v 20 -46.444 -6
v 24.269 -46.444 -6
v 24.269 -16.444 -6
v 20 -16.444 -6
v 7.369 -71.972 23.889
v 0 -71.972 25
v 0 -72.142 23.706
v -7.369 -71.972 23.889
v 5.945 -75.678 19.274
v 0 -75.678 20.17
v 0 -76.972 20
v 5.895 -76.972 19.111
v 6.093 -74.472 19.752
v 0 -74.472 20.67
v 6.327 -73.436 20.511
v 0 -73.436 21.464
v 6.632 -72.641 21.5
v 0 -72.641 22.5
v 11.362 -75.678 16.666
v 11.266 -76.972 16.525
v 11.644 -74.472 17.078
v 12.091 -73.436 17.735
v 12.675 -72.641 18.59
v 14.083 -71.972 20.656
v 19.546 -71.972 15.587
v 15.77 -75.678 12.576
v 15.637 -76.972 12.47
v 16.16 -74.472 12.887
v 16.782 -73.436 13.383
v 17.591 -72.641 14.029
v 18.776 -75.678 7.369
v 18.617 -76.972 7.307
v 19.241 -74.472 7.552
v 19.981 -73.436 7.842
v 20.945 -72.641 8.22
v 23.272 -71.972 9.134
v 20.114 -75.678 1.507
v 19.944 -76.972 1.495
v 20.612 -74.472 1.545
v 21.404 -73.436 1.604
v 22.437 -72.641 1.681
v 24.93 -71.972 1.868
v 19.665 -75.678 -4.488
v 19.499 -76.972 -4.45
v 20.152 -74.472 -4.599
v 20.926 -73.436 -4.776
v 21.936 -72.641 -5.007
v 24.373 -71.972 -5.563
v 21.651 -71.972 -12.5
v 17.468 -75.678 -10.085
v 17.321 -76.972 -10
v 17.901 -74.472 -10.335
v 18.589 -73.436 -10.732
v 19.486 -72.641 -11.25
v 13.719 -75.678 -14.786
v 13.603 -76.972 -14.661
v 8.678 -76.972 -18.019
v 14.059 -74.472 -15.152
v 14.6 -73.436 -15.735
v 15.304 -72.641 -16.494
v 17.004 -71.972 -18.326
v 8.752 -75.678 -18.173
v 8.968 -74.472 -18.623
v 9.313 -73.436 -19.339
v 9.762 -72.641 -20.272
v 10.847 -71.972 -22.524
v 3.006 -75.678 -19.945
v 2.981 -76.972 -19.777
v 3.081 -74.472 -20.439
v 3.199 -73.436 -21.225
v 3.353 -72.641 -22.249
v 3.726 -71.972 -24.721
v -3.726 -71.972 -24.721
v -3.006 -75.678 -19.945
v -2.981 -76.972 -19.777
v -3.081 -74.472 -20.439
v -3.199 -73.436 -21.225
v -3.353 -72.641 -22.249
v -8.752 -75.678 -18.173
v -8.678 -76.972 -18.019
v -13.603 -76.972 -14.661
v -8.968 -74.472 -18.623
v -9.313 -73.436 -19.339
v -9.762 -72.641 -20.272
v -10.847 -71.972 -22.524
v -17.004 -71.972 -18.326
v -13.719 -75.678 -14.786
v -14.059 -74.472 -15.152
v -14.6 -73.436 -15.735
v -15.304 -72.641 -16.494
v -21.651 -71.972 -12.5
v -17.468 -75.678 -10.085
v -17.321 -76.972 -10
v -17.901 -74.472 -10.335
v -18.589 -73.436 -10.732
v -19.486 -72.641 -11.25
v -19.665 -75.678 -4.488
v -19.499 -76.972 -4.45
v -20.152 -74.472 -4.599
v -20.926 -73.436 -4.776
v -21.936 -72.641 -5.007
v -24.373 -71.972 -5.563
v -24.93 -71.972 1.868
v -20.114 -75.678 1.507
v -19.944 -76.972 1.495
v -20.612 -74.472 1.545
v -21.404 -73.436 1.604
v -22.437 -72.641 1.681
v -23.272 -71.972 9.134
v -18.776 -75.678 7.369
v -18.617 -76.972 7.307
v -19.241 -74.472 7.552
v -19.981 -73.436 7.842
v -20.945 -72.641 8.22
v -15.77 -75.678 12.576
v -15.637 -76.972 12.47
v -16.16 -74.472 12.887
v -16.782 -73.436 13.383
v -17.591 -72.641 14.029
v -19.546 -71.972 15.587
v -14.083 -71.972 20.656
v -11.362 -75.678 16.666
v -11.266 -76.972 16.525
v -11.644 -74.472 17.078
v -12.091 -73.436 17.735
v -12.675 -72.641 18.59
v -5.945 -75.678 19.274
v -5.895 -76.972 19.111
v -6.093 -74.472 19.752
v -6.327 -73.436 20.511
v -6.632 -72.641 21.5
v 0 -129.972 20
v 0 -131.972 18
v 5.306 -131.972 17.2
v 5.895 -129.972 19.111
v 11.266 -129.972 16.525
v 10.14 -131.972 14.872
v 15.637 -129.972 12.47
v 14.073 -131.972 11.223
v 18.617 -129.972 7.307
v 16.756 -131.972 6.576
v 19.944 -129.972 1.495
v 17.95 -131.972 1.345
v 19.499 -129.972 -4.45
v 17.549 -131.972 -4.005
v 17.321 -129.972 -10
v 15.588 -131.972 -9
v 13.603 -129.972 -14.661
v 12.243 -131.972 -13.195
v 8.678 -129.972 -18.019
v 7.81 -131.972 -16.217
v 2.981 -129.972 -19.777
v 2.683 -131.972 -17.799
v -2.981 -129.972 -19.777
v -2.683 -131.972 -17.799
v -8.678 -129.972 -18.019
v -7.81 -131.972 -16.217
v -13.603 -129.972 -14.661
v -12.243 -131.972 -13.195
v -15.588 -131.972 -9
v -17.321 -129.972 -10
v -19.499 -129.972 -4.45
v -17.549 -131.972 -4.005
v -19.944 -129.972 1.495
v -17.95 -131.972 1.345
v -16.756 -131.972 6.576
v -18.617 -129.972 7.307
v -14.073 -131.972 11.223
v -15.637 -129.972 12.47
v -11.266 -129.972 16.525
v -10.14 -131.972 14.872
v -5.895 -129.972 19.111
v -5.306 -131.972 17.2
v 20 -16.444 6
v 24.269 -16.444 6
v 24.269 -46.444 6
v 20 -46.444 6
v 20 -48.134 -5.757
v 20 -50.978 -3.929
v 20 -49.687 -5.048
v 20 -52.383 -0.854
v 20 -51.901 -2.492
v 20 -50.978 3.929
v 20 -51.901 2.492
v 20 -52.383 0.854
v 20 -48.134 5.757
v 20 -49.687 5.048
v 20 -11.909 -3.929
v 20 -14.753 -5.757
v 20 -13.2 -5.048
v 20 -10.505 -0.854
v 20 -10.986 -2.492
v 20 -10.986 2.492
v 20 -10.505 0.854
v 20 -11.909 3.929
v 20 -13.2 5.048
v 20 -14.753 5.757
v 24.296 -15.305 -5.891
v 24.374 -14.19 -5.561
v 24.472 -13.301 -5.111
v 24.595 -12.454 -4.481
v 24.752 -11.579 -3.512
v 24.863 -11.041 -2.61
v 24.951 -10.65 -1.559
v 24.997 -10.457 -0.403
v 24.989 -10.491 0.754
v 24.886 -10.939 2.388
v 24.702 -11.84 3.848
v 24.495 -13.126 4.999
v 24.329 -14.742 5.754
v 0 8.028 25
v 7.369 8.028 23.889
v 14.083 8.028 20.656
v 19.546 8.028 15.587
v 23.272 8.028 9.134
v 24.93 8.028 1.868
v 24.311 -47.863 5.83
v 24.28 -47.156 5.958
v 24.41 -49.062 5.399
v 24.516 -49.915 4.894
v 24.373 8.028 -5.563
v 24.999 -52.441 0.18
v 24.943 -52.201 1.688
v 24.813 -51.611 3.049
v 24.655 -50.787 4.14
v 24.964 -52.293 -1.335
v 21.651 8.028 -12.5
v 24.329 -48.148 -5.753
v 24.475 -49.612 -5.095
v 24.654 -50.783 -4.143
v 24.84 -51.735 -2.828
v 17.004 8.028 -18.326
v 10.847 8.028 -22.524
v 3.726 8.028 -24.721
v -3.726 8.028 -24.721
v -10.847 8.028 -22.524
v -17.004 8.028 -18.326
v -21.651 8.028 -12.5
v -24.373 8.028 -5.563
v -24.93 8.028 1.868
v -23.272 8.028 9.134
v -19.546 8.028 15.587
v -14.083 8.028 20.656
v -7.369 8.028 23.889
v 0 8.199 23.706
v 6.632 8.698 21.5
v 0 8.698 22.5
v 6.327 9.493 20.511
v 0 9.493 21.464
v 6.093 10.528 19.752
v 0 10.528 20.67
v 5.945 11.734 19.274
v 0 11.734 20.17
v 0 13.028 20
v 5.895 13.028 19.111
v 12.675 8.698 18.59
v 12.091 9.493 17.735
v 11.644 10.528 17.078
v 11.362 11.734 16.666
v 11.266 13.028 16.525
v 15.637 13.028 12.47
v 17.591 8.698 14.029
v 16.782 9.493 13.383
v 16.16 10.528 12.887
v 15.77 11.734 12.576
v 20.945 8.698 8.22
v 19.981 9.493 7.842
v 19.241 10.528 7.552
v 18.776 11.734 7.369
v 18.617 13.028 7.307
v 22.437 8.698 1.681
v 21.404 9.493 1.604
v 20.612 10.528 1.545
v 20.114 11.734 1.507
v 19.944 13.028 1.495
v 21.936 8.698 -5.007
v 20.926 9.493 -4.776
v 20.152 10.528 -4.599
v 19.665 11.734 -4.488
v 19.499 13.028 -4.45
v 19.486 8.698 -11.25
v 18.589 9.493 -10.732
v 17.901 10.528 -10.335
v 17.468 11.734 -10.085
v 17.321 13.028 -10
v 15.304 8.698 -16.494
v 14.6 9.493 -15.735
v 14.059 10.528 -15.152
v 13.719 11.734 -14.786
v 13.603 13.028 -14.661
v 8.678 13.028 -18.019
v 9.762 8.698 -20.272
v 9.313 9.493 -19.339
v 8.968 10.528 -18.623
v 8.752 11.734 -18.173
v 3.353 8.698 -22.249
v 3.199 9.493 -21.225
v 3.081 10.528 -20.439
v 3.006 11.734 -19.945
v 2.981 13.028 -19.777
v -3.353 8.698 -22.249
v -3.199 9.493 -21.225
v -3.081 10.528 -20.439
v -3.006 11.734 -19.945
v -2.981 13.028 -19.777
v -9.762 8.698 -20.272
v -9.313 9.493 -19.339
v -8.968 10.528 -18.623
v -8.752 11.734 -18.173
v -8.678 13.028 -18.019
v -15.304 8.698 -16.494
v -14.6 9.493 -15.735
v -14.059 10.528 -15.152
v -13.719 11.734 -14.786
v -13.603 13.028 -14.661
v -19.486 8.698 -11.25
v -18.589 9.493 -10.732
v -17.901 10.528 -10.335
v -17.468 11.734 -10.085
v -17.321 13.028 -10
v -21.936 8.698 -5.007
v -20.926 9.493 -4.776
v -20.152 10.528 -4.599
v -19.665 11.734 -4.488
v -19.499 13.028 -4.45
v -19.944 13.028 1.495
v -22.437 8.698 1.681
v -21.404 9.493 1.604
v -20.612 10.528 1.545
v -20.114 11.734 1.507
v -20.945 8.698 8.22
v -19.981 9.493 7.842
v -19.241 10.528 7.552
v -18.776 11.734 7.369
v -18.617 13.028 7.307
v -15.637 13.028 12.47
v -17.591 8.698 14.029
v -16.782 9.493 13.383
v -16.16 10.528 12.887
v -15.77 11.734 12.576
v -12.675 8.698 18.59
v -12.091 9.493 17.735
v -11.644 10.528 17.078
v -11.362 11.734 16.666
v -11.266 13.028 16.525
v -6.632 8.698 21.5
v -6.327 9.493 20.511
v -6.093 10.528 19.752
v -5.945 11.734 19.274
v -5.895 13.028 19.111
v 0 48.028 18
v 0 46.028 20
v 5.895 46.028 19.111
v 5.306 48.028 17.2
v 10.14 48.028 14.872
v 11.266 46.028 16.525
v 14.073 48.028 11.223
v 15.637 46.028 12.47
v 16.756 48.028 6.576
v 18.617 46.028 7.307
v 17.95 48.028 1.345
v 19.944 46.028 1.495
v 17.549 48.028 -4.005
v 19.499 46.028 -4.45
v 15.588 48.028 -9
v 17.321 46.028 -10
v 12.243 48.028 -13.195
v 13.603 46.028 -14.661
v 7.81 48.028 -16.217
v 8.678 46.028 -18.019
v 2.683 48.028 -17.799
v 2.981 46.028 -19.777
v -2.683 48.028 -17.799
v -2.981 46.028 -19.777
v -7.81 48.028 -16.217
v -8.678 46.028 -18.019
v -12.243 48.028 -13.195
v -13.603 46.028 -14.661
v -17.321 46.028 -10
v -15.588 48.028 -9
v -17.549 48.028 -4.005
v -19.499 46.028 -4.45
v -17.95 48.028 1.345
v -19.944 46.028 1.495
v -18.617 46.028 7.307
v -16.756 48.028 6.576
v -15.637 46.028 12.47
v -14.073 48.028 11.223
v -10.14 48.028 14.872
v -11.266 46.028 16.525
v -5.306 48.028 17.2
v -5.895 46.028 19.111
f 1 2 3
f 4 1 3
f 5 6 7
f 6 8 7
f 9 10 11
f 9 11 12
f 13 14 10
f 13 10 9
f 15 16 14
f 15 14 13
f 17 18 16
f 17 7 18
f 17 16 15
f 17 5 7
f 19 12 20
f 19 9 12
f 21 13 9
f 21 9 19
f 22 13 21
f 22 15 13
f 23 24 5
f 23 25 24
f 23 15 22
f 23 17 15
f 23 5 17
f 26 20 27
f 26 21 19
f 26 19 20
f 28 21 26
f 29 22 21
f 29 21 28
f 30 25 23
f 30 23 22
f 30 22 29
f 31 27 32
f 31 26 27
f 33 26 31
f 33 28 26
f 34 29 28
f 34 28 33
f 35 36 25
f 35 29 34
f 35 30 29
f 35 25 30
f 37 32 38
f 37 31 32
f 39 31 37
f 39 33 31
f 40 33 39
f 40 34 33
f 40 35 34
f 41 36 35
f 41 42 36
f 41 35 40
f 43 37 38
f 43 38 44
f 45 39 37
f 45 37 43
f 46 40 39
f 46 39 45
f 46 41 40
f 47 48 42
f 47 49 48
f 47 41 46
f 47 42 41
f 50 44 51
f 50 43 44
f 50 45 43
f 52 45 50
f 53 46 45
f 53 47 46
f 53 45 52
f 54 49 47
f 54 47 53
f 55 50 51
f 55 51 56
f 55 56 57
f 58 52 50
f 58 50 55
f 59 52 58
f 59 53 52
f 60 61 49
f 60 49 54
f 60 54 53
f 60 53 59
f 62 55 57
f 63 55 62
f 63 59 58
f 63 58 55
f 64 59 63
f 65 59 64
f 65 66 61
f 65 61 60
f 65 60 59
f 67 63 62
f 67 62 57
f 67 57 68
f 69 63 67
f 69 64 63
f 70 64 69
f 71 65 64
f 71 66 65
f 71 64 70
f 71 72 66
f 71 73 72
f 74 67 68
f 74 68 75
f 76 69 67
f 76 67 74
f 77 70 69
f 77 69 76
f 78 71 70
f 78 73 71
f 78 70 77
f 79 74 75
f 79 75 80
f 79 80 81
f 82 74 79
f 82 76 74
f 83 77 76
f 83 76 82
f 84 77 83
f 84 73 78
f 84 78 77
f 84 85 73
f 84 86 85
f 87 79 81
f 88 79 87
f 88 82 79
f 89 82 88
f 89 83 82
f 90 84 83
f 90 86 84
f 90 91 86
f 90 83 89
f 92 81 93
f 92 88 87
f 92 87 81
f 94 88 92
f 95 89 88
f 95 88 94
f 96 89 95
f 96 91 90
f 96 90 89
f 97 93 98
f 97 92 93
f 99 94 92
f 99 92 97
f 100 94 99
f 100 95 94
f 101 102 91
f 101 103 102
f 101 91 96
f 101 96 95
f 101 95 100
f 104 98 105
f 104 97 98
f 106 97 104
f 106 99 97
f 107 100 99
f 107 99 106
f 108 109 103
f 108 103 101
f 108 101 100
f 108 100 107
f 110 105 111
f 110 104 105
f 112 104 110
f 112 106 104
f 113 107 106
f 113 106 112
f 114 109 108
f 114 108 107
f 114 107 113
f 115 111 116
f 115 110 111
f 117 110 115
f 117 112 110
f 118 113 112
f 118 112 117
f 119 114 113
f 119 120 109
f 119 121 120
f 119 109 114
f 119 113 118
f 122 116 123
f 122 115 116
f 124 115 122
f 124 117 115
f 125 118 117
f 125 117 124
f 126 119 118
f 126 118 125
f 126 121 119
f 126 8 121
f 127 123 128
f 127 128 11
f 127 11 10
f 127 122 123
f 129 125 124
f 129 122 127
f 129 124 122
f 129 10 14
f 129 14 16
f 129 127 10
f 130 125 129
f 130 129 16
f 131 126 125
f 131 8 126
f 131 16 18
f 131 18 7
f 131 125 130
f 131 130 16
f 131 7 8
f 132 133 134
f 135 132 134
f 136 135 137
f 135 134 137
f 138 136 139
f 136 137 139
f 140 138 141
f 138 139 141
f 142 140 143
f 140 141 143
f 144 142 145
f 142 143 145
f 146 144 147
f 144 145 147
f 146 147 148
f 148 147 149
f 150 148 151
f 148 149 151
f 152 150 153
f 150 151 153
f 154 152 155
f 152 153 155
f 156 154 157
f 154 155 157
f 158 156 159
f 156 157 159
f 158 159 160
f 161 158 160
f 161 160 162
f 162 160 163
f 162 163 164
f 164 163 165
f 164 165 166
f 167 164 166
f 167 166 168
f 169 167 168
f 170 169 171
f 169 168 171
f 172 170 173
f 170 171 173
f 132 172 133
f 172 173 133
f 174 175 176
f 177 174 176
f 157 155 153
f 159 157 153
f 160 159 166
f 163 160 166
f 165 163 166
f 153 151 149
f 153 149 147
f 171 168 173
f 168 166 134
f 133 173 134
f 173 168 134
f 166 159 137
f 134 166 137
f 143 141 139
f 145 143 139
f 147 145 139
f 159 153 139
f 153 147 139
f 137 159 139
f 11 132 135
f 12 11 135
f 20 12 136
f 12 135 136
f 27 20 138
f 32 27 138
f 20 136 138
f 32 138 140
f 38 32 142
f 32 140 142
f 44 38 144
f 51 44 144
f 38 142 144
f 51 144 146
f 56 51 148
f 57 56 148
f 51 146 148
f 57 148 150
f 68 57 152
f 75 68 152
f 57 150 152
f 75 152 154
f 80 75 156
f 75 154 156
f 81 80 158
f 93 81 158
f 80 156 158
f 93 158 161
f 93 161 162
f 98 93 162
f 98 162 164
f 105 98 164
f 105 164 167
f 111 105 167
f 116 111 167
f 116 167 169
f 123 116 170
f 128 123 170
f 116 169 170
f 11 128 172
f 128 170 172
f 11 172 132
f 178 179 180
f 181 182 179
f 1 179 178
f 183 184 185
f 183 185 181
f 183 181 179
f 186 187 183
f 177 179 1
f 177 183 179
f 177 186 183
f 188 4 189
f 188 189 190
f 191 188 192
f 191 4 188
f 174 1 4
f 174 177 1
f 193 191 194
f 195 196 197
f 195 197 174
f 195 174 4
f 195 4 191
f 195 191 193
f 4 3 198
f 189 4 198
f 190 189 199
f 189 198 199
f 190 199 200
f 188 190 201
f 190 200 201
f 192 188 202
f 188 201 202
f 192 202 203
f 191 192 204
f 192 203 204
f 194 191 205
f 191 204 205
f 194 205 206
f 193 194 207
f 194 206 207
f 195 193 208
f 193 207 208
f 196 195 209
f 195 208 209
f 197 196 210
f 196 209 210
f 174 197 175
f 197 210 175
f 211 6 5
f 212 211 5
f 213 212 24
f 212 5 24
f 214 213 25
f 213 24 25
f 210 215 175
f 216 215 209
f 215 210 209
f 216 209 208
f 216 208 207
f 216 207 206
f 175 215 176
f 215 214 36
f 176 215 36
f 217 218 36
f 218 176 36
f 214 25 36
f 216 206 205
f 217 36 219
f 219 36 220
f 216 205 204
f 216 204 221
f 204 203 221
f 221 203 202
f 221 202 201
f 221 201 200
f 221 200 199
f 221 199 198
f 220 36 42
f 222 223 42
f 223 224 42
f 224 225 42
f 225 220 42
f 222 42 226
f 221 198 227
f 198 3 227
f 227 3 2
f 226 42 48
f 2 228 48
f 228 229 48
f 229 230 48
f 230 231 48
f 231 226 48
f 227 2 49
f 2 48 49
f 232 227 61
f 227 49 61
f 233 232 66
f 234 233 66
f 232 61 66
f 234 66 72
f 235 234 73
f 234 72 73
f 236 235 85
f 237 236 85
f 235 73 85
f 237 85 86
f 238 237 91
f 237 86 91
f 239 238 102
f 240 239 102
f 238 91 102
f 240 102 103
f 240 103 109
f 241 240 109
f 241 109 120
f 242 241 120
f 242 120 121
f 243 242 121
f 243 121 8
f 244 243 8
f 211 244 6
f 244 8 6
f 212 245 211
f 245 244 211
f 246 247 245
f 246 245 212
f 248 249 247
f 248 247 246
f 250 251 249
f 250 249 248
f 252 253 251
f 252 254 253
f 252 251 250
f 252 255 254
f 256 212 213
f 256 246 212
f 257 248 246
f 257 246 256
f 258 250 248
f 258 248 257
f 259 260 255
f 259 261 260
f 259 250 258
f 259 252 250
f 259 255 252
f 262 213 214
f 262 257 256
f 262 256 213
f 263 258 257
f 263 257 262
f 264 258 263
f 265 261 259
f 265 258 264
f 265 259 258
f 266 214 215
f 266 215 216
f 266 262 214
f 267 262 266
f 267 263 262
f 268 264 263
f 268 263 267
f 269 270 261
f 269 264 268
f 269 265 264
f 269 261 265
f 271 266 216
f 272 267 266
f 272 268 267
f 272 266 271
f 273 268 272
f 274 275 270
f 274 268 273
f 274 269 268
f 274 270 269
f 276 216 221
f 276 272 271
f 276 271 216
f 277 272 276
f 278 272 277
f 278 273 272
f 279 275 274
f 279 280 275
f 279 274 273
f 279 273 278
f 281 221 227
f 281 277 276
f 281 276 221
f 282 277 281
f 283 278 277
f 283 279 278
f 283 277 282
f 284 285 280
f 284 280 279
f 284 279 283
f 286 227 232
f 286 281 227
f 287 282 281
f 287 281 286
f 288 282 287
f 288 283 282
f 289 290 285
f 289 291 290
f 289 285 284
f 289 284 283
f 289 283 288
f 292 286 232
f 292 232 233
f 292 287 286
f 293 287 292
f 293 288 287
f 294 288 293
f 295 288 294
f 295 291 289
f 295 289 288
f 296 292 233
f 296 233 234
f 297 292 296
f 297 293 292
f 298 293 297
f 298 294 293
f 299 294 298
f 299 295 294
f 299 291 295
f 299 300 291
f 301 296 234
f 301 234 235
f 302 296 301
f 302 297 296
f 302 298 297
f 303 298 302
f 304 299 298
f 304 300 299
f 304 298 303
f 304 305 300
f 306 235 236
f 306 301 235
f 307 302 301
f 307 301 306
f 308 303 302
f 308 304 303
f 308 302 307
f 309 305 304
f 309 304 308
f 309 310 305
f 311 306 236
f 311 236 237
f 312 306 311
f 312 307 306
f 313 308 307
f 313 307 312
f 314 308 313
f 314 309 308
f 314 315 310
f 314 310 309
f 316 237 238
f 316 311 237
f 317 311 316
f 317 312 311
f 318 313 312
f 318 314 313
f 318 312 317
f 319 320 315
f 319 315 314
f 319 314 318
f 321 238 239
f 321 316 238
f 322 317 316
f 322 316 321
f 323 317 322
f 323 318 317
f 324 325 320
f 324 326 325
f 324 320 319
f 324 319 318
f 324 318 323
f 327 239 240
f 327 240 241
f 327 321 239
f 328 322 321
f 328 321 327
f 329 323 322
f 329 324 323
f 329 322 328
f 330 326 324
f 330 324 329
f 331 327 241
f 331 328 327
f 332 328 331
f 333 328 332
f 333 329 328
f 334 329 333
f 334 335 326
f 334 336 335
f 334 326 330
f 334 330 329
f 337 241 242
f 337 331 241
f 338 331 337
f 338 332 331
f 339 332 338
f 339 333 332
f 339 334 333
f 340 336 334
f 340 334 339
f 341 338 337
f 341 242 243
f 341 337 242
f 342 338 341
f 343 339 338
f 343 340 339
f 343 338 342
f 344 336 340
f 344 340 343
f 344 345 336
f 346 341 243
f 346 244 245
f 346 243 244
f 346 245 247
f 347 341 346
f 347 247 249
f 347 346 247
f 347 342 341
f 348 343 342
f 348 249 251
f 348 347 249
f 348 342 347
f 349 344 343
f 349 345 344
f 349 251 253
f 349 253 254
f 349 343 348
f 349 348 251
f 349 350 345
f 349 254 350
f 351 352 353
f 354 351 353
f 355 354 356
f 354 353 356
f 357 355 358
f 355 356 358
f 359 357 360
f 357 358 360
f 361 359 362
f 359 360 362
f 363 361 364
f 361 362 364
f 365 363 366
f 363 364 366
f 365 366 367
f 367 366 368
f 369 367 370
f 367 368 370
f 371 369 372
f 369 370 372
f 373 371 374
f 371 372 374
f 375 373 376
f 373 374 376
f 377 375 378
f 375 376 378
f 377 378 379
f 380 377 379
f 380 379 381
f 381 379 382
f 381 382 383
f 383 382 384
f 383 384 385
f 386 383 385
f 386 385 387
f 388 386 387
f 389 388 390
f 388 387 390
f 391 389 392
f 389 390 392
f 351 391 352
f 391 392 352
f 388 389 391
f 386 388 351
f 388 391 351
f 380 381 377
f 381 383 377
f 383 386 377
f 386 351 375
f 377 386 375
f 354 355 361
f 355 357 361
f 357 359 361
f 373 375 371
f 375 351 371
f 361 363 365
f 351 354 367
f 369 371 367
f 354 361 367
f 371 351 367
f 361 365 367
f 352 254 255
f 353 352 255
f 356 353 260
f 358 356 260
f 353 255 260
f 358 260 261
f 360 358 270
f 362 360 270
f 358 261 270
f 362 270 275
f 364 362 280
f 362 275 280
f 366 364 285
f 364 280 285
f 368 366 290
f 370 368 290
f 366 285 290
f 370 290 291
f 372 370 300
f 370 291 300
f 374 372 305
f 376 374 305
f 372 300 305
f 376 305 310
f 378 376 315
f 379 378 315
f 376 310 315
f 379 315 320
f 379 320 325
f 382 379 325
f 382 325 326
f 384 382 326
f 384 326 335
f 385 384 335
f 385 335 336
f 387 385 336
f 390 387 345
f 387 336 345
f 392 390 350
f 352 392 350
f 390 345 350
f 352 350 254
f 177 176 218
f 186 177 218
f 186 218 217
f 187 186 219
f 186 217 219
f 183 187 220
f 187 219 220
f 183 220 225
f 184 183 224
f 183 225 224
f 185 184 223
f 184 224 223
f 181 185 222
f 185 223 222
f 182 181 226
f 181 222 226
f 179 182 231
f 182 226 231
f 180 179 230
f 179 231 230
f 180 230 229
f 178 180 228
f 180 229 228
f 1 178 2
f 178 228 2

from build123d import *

# Parameters (mm, degrees)
F4_SIZE  = 2
F5_R     = 4.99999
F6_DEPTH = 5


# Not quite as in the source:
# - a fillet or chamfer is up to 0.001 mm smaller than in the source, because OpenCascade refuses the exact size


with BuildPart() as f1:
    # F0 (on Right) → F1 (revolve)
    with BuildSketch(Plane.YZ):
        Polygon((8.0283725262, 25), (0, 25), (-71.9716274738, 25), (-71.9716274738, 20), (-131.9716274738, 20), (-131.9716274738, 0), (48.0283725262, 0), (48.0283725262, 20), (8.0283725262, 20), align=None)
    revolve(axis=Axis((0, -30.3001217544, 0), (0, 1, 0)))

    # F4
    f4_edges = [f1.edges().sort_by_distance(p)[0] for p in [
        (0, -131.971627, -20),
        (0, 48.028373, -20),
    ]]
    chamfer(f4_edges, length=F4_SIZE)

    # F5 (radius 5 in the source; OpenCascade refuses exactly that, so slightly less here)
    f5_edges = [f1.edges().sort_by_distance(p)[0] for p in [
        (0, -71.971627, -20),
        (0, 8.028373, -20),
    ]]
    fillet(f5_edges, radius=F5_R)

    # F3 (on offset) → F6 (cut)
    with BuildSketch(Plane.YZ.offset(25)):
        with BuildLine():
            Line((-16.4436194198, 6), (-46.4436194198, 6))
            ThreePointArc((-46.4436194198, 6), (-52.4436194198, 0), (-46.4436194198, -6))
            Line((-46.4436194198, -6), (-16.4436194198, -6))
            ThreePointArc((-16.4436194198, -6), (-10.4436194198, 0), (-16.4436194198, 6))
        make_face()
    extrude(amount=-F6_DEPTH, mode=Mode.SUBTRACT)


solid = f1.part
